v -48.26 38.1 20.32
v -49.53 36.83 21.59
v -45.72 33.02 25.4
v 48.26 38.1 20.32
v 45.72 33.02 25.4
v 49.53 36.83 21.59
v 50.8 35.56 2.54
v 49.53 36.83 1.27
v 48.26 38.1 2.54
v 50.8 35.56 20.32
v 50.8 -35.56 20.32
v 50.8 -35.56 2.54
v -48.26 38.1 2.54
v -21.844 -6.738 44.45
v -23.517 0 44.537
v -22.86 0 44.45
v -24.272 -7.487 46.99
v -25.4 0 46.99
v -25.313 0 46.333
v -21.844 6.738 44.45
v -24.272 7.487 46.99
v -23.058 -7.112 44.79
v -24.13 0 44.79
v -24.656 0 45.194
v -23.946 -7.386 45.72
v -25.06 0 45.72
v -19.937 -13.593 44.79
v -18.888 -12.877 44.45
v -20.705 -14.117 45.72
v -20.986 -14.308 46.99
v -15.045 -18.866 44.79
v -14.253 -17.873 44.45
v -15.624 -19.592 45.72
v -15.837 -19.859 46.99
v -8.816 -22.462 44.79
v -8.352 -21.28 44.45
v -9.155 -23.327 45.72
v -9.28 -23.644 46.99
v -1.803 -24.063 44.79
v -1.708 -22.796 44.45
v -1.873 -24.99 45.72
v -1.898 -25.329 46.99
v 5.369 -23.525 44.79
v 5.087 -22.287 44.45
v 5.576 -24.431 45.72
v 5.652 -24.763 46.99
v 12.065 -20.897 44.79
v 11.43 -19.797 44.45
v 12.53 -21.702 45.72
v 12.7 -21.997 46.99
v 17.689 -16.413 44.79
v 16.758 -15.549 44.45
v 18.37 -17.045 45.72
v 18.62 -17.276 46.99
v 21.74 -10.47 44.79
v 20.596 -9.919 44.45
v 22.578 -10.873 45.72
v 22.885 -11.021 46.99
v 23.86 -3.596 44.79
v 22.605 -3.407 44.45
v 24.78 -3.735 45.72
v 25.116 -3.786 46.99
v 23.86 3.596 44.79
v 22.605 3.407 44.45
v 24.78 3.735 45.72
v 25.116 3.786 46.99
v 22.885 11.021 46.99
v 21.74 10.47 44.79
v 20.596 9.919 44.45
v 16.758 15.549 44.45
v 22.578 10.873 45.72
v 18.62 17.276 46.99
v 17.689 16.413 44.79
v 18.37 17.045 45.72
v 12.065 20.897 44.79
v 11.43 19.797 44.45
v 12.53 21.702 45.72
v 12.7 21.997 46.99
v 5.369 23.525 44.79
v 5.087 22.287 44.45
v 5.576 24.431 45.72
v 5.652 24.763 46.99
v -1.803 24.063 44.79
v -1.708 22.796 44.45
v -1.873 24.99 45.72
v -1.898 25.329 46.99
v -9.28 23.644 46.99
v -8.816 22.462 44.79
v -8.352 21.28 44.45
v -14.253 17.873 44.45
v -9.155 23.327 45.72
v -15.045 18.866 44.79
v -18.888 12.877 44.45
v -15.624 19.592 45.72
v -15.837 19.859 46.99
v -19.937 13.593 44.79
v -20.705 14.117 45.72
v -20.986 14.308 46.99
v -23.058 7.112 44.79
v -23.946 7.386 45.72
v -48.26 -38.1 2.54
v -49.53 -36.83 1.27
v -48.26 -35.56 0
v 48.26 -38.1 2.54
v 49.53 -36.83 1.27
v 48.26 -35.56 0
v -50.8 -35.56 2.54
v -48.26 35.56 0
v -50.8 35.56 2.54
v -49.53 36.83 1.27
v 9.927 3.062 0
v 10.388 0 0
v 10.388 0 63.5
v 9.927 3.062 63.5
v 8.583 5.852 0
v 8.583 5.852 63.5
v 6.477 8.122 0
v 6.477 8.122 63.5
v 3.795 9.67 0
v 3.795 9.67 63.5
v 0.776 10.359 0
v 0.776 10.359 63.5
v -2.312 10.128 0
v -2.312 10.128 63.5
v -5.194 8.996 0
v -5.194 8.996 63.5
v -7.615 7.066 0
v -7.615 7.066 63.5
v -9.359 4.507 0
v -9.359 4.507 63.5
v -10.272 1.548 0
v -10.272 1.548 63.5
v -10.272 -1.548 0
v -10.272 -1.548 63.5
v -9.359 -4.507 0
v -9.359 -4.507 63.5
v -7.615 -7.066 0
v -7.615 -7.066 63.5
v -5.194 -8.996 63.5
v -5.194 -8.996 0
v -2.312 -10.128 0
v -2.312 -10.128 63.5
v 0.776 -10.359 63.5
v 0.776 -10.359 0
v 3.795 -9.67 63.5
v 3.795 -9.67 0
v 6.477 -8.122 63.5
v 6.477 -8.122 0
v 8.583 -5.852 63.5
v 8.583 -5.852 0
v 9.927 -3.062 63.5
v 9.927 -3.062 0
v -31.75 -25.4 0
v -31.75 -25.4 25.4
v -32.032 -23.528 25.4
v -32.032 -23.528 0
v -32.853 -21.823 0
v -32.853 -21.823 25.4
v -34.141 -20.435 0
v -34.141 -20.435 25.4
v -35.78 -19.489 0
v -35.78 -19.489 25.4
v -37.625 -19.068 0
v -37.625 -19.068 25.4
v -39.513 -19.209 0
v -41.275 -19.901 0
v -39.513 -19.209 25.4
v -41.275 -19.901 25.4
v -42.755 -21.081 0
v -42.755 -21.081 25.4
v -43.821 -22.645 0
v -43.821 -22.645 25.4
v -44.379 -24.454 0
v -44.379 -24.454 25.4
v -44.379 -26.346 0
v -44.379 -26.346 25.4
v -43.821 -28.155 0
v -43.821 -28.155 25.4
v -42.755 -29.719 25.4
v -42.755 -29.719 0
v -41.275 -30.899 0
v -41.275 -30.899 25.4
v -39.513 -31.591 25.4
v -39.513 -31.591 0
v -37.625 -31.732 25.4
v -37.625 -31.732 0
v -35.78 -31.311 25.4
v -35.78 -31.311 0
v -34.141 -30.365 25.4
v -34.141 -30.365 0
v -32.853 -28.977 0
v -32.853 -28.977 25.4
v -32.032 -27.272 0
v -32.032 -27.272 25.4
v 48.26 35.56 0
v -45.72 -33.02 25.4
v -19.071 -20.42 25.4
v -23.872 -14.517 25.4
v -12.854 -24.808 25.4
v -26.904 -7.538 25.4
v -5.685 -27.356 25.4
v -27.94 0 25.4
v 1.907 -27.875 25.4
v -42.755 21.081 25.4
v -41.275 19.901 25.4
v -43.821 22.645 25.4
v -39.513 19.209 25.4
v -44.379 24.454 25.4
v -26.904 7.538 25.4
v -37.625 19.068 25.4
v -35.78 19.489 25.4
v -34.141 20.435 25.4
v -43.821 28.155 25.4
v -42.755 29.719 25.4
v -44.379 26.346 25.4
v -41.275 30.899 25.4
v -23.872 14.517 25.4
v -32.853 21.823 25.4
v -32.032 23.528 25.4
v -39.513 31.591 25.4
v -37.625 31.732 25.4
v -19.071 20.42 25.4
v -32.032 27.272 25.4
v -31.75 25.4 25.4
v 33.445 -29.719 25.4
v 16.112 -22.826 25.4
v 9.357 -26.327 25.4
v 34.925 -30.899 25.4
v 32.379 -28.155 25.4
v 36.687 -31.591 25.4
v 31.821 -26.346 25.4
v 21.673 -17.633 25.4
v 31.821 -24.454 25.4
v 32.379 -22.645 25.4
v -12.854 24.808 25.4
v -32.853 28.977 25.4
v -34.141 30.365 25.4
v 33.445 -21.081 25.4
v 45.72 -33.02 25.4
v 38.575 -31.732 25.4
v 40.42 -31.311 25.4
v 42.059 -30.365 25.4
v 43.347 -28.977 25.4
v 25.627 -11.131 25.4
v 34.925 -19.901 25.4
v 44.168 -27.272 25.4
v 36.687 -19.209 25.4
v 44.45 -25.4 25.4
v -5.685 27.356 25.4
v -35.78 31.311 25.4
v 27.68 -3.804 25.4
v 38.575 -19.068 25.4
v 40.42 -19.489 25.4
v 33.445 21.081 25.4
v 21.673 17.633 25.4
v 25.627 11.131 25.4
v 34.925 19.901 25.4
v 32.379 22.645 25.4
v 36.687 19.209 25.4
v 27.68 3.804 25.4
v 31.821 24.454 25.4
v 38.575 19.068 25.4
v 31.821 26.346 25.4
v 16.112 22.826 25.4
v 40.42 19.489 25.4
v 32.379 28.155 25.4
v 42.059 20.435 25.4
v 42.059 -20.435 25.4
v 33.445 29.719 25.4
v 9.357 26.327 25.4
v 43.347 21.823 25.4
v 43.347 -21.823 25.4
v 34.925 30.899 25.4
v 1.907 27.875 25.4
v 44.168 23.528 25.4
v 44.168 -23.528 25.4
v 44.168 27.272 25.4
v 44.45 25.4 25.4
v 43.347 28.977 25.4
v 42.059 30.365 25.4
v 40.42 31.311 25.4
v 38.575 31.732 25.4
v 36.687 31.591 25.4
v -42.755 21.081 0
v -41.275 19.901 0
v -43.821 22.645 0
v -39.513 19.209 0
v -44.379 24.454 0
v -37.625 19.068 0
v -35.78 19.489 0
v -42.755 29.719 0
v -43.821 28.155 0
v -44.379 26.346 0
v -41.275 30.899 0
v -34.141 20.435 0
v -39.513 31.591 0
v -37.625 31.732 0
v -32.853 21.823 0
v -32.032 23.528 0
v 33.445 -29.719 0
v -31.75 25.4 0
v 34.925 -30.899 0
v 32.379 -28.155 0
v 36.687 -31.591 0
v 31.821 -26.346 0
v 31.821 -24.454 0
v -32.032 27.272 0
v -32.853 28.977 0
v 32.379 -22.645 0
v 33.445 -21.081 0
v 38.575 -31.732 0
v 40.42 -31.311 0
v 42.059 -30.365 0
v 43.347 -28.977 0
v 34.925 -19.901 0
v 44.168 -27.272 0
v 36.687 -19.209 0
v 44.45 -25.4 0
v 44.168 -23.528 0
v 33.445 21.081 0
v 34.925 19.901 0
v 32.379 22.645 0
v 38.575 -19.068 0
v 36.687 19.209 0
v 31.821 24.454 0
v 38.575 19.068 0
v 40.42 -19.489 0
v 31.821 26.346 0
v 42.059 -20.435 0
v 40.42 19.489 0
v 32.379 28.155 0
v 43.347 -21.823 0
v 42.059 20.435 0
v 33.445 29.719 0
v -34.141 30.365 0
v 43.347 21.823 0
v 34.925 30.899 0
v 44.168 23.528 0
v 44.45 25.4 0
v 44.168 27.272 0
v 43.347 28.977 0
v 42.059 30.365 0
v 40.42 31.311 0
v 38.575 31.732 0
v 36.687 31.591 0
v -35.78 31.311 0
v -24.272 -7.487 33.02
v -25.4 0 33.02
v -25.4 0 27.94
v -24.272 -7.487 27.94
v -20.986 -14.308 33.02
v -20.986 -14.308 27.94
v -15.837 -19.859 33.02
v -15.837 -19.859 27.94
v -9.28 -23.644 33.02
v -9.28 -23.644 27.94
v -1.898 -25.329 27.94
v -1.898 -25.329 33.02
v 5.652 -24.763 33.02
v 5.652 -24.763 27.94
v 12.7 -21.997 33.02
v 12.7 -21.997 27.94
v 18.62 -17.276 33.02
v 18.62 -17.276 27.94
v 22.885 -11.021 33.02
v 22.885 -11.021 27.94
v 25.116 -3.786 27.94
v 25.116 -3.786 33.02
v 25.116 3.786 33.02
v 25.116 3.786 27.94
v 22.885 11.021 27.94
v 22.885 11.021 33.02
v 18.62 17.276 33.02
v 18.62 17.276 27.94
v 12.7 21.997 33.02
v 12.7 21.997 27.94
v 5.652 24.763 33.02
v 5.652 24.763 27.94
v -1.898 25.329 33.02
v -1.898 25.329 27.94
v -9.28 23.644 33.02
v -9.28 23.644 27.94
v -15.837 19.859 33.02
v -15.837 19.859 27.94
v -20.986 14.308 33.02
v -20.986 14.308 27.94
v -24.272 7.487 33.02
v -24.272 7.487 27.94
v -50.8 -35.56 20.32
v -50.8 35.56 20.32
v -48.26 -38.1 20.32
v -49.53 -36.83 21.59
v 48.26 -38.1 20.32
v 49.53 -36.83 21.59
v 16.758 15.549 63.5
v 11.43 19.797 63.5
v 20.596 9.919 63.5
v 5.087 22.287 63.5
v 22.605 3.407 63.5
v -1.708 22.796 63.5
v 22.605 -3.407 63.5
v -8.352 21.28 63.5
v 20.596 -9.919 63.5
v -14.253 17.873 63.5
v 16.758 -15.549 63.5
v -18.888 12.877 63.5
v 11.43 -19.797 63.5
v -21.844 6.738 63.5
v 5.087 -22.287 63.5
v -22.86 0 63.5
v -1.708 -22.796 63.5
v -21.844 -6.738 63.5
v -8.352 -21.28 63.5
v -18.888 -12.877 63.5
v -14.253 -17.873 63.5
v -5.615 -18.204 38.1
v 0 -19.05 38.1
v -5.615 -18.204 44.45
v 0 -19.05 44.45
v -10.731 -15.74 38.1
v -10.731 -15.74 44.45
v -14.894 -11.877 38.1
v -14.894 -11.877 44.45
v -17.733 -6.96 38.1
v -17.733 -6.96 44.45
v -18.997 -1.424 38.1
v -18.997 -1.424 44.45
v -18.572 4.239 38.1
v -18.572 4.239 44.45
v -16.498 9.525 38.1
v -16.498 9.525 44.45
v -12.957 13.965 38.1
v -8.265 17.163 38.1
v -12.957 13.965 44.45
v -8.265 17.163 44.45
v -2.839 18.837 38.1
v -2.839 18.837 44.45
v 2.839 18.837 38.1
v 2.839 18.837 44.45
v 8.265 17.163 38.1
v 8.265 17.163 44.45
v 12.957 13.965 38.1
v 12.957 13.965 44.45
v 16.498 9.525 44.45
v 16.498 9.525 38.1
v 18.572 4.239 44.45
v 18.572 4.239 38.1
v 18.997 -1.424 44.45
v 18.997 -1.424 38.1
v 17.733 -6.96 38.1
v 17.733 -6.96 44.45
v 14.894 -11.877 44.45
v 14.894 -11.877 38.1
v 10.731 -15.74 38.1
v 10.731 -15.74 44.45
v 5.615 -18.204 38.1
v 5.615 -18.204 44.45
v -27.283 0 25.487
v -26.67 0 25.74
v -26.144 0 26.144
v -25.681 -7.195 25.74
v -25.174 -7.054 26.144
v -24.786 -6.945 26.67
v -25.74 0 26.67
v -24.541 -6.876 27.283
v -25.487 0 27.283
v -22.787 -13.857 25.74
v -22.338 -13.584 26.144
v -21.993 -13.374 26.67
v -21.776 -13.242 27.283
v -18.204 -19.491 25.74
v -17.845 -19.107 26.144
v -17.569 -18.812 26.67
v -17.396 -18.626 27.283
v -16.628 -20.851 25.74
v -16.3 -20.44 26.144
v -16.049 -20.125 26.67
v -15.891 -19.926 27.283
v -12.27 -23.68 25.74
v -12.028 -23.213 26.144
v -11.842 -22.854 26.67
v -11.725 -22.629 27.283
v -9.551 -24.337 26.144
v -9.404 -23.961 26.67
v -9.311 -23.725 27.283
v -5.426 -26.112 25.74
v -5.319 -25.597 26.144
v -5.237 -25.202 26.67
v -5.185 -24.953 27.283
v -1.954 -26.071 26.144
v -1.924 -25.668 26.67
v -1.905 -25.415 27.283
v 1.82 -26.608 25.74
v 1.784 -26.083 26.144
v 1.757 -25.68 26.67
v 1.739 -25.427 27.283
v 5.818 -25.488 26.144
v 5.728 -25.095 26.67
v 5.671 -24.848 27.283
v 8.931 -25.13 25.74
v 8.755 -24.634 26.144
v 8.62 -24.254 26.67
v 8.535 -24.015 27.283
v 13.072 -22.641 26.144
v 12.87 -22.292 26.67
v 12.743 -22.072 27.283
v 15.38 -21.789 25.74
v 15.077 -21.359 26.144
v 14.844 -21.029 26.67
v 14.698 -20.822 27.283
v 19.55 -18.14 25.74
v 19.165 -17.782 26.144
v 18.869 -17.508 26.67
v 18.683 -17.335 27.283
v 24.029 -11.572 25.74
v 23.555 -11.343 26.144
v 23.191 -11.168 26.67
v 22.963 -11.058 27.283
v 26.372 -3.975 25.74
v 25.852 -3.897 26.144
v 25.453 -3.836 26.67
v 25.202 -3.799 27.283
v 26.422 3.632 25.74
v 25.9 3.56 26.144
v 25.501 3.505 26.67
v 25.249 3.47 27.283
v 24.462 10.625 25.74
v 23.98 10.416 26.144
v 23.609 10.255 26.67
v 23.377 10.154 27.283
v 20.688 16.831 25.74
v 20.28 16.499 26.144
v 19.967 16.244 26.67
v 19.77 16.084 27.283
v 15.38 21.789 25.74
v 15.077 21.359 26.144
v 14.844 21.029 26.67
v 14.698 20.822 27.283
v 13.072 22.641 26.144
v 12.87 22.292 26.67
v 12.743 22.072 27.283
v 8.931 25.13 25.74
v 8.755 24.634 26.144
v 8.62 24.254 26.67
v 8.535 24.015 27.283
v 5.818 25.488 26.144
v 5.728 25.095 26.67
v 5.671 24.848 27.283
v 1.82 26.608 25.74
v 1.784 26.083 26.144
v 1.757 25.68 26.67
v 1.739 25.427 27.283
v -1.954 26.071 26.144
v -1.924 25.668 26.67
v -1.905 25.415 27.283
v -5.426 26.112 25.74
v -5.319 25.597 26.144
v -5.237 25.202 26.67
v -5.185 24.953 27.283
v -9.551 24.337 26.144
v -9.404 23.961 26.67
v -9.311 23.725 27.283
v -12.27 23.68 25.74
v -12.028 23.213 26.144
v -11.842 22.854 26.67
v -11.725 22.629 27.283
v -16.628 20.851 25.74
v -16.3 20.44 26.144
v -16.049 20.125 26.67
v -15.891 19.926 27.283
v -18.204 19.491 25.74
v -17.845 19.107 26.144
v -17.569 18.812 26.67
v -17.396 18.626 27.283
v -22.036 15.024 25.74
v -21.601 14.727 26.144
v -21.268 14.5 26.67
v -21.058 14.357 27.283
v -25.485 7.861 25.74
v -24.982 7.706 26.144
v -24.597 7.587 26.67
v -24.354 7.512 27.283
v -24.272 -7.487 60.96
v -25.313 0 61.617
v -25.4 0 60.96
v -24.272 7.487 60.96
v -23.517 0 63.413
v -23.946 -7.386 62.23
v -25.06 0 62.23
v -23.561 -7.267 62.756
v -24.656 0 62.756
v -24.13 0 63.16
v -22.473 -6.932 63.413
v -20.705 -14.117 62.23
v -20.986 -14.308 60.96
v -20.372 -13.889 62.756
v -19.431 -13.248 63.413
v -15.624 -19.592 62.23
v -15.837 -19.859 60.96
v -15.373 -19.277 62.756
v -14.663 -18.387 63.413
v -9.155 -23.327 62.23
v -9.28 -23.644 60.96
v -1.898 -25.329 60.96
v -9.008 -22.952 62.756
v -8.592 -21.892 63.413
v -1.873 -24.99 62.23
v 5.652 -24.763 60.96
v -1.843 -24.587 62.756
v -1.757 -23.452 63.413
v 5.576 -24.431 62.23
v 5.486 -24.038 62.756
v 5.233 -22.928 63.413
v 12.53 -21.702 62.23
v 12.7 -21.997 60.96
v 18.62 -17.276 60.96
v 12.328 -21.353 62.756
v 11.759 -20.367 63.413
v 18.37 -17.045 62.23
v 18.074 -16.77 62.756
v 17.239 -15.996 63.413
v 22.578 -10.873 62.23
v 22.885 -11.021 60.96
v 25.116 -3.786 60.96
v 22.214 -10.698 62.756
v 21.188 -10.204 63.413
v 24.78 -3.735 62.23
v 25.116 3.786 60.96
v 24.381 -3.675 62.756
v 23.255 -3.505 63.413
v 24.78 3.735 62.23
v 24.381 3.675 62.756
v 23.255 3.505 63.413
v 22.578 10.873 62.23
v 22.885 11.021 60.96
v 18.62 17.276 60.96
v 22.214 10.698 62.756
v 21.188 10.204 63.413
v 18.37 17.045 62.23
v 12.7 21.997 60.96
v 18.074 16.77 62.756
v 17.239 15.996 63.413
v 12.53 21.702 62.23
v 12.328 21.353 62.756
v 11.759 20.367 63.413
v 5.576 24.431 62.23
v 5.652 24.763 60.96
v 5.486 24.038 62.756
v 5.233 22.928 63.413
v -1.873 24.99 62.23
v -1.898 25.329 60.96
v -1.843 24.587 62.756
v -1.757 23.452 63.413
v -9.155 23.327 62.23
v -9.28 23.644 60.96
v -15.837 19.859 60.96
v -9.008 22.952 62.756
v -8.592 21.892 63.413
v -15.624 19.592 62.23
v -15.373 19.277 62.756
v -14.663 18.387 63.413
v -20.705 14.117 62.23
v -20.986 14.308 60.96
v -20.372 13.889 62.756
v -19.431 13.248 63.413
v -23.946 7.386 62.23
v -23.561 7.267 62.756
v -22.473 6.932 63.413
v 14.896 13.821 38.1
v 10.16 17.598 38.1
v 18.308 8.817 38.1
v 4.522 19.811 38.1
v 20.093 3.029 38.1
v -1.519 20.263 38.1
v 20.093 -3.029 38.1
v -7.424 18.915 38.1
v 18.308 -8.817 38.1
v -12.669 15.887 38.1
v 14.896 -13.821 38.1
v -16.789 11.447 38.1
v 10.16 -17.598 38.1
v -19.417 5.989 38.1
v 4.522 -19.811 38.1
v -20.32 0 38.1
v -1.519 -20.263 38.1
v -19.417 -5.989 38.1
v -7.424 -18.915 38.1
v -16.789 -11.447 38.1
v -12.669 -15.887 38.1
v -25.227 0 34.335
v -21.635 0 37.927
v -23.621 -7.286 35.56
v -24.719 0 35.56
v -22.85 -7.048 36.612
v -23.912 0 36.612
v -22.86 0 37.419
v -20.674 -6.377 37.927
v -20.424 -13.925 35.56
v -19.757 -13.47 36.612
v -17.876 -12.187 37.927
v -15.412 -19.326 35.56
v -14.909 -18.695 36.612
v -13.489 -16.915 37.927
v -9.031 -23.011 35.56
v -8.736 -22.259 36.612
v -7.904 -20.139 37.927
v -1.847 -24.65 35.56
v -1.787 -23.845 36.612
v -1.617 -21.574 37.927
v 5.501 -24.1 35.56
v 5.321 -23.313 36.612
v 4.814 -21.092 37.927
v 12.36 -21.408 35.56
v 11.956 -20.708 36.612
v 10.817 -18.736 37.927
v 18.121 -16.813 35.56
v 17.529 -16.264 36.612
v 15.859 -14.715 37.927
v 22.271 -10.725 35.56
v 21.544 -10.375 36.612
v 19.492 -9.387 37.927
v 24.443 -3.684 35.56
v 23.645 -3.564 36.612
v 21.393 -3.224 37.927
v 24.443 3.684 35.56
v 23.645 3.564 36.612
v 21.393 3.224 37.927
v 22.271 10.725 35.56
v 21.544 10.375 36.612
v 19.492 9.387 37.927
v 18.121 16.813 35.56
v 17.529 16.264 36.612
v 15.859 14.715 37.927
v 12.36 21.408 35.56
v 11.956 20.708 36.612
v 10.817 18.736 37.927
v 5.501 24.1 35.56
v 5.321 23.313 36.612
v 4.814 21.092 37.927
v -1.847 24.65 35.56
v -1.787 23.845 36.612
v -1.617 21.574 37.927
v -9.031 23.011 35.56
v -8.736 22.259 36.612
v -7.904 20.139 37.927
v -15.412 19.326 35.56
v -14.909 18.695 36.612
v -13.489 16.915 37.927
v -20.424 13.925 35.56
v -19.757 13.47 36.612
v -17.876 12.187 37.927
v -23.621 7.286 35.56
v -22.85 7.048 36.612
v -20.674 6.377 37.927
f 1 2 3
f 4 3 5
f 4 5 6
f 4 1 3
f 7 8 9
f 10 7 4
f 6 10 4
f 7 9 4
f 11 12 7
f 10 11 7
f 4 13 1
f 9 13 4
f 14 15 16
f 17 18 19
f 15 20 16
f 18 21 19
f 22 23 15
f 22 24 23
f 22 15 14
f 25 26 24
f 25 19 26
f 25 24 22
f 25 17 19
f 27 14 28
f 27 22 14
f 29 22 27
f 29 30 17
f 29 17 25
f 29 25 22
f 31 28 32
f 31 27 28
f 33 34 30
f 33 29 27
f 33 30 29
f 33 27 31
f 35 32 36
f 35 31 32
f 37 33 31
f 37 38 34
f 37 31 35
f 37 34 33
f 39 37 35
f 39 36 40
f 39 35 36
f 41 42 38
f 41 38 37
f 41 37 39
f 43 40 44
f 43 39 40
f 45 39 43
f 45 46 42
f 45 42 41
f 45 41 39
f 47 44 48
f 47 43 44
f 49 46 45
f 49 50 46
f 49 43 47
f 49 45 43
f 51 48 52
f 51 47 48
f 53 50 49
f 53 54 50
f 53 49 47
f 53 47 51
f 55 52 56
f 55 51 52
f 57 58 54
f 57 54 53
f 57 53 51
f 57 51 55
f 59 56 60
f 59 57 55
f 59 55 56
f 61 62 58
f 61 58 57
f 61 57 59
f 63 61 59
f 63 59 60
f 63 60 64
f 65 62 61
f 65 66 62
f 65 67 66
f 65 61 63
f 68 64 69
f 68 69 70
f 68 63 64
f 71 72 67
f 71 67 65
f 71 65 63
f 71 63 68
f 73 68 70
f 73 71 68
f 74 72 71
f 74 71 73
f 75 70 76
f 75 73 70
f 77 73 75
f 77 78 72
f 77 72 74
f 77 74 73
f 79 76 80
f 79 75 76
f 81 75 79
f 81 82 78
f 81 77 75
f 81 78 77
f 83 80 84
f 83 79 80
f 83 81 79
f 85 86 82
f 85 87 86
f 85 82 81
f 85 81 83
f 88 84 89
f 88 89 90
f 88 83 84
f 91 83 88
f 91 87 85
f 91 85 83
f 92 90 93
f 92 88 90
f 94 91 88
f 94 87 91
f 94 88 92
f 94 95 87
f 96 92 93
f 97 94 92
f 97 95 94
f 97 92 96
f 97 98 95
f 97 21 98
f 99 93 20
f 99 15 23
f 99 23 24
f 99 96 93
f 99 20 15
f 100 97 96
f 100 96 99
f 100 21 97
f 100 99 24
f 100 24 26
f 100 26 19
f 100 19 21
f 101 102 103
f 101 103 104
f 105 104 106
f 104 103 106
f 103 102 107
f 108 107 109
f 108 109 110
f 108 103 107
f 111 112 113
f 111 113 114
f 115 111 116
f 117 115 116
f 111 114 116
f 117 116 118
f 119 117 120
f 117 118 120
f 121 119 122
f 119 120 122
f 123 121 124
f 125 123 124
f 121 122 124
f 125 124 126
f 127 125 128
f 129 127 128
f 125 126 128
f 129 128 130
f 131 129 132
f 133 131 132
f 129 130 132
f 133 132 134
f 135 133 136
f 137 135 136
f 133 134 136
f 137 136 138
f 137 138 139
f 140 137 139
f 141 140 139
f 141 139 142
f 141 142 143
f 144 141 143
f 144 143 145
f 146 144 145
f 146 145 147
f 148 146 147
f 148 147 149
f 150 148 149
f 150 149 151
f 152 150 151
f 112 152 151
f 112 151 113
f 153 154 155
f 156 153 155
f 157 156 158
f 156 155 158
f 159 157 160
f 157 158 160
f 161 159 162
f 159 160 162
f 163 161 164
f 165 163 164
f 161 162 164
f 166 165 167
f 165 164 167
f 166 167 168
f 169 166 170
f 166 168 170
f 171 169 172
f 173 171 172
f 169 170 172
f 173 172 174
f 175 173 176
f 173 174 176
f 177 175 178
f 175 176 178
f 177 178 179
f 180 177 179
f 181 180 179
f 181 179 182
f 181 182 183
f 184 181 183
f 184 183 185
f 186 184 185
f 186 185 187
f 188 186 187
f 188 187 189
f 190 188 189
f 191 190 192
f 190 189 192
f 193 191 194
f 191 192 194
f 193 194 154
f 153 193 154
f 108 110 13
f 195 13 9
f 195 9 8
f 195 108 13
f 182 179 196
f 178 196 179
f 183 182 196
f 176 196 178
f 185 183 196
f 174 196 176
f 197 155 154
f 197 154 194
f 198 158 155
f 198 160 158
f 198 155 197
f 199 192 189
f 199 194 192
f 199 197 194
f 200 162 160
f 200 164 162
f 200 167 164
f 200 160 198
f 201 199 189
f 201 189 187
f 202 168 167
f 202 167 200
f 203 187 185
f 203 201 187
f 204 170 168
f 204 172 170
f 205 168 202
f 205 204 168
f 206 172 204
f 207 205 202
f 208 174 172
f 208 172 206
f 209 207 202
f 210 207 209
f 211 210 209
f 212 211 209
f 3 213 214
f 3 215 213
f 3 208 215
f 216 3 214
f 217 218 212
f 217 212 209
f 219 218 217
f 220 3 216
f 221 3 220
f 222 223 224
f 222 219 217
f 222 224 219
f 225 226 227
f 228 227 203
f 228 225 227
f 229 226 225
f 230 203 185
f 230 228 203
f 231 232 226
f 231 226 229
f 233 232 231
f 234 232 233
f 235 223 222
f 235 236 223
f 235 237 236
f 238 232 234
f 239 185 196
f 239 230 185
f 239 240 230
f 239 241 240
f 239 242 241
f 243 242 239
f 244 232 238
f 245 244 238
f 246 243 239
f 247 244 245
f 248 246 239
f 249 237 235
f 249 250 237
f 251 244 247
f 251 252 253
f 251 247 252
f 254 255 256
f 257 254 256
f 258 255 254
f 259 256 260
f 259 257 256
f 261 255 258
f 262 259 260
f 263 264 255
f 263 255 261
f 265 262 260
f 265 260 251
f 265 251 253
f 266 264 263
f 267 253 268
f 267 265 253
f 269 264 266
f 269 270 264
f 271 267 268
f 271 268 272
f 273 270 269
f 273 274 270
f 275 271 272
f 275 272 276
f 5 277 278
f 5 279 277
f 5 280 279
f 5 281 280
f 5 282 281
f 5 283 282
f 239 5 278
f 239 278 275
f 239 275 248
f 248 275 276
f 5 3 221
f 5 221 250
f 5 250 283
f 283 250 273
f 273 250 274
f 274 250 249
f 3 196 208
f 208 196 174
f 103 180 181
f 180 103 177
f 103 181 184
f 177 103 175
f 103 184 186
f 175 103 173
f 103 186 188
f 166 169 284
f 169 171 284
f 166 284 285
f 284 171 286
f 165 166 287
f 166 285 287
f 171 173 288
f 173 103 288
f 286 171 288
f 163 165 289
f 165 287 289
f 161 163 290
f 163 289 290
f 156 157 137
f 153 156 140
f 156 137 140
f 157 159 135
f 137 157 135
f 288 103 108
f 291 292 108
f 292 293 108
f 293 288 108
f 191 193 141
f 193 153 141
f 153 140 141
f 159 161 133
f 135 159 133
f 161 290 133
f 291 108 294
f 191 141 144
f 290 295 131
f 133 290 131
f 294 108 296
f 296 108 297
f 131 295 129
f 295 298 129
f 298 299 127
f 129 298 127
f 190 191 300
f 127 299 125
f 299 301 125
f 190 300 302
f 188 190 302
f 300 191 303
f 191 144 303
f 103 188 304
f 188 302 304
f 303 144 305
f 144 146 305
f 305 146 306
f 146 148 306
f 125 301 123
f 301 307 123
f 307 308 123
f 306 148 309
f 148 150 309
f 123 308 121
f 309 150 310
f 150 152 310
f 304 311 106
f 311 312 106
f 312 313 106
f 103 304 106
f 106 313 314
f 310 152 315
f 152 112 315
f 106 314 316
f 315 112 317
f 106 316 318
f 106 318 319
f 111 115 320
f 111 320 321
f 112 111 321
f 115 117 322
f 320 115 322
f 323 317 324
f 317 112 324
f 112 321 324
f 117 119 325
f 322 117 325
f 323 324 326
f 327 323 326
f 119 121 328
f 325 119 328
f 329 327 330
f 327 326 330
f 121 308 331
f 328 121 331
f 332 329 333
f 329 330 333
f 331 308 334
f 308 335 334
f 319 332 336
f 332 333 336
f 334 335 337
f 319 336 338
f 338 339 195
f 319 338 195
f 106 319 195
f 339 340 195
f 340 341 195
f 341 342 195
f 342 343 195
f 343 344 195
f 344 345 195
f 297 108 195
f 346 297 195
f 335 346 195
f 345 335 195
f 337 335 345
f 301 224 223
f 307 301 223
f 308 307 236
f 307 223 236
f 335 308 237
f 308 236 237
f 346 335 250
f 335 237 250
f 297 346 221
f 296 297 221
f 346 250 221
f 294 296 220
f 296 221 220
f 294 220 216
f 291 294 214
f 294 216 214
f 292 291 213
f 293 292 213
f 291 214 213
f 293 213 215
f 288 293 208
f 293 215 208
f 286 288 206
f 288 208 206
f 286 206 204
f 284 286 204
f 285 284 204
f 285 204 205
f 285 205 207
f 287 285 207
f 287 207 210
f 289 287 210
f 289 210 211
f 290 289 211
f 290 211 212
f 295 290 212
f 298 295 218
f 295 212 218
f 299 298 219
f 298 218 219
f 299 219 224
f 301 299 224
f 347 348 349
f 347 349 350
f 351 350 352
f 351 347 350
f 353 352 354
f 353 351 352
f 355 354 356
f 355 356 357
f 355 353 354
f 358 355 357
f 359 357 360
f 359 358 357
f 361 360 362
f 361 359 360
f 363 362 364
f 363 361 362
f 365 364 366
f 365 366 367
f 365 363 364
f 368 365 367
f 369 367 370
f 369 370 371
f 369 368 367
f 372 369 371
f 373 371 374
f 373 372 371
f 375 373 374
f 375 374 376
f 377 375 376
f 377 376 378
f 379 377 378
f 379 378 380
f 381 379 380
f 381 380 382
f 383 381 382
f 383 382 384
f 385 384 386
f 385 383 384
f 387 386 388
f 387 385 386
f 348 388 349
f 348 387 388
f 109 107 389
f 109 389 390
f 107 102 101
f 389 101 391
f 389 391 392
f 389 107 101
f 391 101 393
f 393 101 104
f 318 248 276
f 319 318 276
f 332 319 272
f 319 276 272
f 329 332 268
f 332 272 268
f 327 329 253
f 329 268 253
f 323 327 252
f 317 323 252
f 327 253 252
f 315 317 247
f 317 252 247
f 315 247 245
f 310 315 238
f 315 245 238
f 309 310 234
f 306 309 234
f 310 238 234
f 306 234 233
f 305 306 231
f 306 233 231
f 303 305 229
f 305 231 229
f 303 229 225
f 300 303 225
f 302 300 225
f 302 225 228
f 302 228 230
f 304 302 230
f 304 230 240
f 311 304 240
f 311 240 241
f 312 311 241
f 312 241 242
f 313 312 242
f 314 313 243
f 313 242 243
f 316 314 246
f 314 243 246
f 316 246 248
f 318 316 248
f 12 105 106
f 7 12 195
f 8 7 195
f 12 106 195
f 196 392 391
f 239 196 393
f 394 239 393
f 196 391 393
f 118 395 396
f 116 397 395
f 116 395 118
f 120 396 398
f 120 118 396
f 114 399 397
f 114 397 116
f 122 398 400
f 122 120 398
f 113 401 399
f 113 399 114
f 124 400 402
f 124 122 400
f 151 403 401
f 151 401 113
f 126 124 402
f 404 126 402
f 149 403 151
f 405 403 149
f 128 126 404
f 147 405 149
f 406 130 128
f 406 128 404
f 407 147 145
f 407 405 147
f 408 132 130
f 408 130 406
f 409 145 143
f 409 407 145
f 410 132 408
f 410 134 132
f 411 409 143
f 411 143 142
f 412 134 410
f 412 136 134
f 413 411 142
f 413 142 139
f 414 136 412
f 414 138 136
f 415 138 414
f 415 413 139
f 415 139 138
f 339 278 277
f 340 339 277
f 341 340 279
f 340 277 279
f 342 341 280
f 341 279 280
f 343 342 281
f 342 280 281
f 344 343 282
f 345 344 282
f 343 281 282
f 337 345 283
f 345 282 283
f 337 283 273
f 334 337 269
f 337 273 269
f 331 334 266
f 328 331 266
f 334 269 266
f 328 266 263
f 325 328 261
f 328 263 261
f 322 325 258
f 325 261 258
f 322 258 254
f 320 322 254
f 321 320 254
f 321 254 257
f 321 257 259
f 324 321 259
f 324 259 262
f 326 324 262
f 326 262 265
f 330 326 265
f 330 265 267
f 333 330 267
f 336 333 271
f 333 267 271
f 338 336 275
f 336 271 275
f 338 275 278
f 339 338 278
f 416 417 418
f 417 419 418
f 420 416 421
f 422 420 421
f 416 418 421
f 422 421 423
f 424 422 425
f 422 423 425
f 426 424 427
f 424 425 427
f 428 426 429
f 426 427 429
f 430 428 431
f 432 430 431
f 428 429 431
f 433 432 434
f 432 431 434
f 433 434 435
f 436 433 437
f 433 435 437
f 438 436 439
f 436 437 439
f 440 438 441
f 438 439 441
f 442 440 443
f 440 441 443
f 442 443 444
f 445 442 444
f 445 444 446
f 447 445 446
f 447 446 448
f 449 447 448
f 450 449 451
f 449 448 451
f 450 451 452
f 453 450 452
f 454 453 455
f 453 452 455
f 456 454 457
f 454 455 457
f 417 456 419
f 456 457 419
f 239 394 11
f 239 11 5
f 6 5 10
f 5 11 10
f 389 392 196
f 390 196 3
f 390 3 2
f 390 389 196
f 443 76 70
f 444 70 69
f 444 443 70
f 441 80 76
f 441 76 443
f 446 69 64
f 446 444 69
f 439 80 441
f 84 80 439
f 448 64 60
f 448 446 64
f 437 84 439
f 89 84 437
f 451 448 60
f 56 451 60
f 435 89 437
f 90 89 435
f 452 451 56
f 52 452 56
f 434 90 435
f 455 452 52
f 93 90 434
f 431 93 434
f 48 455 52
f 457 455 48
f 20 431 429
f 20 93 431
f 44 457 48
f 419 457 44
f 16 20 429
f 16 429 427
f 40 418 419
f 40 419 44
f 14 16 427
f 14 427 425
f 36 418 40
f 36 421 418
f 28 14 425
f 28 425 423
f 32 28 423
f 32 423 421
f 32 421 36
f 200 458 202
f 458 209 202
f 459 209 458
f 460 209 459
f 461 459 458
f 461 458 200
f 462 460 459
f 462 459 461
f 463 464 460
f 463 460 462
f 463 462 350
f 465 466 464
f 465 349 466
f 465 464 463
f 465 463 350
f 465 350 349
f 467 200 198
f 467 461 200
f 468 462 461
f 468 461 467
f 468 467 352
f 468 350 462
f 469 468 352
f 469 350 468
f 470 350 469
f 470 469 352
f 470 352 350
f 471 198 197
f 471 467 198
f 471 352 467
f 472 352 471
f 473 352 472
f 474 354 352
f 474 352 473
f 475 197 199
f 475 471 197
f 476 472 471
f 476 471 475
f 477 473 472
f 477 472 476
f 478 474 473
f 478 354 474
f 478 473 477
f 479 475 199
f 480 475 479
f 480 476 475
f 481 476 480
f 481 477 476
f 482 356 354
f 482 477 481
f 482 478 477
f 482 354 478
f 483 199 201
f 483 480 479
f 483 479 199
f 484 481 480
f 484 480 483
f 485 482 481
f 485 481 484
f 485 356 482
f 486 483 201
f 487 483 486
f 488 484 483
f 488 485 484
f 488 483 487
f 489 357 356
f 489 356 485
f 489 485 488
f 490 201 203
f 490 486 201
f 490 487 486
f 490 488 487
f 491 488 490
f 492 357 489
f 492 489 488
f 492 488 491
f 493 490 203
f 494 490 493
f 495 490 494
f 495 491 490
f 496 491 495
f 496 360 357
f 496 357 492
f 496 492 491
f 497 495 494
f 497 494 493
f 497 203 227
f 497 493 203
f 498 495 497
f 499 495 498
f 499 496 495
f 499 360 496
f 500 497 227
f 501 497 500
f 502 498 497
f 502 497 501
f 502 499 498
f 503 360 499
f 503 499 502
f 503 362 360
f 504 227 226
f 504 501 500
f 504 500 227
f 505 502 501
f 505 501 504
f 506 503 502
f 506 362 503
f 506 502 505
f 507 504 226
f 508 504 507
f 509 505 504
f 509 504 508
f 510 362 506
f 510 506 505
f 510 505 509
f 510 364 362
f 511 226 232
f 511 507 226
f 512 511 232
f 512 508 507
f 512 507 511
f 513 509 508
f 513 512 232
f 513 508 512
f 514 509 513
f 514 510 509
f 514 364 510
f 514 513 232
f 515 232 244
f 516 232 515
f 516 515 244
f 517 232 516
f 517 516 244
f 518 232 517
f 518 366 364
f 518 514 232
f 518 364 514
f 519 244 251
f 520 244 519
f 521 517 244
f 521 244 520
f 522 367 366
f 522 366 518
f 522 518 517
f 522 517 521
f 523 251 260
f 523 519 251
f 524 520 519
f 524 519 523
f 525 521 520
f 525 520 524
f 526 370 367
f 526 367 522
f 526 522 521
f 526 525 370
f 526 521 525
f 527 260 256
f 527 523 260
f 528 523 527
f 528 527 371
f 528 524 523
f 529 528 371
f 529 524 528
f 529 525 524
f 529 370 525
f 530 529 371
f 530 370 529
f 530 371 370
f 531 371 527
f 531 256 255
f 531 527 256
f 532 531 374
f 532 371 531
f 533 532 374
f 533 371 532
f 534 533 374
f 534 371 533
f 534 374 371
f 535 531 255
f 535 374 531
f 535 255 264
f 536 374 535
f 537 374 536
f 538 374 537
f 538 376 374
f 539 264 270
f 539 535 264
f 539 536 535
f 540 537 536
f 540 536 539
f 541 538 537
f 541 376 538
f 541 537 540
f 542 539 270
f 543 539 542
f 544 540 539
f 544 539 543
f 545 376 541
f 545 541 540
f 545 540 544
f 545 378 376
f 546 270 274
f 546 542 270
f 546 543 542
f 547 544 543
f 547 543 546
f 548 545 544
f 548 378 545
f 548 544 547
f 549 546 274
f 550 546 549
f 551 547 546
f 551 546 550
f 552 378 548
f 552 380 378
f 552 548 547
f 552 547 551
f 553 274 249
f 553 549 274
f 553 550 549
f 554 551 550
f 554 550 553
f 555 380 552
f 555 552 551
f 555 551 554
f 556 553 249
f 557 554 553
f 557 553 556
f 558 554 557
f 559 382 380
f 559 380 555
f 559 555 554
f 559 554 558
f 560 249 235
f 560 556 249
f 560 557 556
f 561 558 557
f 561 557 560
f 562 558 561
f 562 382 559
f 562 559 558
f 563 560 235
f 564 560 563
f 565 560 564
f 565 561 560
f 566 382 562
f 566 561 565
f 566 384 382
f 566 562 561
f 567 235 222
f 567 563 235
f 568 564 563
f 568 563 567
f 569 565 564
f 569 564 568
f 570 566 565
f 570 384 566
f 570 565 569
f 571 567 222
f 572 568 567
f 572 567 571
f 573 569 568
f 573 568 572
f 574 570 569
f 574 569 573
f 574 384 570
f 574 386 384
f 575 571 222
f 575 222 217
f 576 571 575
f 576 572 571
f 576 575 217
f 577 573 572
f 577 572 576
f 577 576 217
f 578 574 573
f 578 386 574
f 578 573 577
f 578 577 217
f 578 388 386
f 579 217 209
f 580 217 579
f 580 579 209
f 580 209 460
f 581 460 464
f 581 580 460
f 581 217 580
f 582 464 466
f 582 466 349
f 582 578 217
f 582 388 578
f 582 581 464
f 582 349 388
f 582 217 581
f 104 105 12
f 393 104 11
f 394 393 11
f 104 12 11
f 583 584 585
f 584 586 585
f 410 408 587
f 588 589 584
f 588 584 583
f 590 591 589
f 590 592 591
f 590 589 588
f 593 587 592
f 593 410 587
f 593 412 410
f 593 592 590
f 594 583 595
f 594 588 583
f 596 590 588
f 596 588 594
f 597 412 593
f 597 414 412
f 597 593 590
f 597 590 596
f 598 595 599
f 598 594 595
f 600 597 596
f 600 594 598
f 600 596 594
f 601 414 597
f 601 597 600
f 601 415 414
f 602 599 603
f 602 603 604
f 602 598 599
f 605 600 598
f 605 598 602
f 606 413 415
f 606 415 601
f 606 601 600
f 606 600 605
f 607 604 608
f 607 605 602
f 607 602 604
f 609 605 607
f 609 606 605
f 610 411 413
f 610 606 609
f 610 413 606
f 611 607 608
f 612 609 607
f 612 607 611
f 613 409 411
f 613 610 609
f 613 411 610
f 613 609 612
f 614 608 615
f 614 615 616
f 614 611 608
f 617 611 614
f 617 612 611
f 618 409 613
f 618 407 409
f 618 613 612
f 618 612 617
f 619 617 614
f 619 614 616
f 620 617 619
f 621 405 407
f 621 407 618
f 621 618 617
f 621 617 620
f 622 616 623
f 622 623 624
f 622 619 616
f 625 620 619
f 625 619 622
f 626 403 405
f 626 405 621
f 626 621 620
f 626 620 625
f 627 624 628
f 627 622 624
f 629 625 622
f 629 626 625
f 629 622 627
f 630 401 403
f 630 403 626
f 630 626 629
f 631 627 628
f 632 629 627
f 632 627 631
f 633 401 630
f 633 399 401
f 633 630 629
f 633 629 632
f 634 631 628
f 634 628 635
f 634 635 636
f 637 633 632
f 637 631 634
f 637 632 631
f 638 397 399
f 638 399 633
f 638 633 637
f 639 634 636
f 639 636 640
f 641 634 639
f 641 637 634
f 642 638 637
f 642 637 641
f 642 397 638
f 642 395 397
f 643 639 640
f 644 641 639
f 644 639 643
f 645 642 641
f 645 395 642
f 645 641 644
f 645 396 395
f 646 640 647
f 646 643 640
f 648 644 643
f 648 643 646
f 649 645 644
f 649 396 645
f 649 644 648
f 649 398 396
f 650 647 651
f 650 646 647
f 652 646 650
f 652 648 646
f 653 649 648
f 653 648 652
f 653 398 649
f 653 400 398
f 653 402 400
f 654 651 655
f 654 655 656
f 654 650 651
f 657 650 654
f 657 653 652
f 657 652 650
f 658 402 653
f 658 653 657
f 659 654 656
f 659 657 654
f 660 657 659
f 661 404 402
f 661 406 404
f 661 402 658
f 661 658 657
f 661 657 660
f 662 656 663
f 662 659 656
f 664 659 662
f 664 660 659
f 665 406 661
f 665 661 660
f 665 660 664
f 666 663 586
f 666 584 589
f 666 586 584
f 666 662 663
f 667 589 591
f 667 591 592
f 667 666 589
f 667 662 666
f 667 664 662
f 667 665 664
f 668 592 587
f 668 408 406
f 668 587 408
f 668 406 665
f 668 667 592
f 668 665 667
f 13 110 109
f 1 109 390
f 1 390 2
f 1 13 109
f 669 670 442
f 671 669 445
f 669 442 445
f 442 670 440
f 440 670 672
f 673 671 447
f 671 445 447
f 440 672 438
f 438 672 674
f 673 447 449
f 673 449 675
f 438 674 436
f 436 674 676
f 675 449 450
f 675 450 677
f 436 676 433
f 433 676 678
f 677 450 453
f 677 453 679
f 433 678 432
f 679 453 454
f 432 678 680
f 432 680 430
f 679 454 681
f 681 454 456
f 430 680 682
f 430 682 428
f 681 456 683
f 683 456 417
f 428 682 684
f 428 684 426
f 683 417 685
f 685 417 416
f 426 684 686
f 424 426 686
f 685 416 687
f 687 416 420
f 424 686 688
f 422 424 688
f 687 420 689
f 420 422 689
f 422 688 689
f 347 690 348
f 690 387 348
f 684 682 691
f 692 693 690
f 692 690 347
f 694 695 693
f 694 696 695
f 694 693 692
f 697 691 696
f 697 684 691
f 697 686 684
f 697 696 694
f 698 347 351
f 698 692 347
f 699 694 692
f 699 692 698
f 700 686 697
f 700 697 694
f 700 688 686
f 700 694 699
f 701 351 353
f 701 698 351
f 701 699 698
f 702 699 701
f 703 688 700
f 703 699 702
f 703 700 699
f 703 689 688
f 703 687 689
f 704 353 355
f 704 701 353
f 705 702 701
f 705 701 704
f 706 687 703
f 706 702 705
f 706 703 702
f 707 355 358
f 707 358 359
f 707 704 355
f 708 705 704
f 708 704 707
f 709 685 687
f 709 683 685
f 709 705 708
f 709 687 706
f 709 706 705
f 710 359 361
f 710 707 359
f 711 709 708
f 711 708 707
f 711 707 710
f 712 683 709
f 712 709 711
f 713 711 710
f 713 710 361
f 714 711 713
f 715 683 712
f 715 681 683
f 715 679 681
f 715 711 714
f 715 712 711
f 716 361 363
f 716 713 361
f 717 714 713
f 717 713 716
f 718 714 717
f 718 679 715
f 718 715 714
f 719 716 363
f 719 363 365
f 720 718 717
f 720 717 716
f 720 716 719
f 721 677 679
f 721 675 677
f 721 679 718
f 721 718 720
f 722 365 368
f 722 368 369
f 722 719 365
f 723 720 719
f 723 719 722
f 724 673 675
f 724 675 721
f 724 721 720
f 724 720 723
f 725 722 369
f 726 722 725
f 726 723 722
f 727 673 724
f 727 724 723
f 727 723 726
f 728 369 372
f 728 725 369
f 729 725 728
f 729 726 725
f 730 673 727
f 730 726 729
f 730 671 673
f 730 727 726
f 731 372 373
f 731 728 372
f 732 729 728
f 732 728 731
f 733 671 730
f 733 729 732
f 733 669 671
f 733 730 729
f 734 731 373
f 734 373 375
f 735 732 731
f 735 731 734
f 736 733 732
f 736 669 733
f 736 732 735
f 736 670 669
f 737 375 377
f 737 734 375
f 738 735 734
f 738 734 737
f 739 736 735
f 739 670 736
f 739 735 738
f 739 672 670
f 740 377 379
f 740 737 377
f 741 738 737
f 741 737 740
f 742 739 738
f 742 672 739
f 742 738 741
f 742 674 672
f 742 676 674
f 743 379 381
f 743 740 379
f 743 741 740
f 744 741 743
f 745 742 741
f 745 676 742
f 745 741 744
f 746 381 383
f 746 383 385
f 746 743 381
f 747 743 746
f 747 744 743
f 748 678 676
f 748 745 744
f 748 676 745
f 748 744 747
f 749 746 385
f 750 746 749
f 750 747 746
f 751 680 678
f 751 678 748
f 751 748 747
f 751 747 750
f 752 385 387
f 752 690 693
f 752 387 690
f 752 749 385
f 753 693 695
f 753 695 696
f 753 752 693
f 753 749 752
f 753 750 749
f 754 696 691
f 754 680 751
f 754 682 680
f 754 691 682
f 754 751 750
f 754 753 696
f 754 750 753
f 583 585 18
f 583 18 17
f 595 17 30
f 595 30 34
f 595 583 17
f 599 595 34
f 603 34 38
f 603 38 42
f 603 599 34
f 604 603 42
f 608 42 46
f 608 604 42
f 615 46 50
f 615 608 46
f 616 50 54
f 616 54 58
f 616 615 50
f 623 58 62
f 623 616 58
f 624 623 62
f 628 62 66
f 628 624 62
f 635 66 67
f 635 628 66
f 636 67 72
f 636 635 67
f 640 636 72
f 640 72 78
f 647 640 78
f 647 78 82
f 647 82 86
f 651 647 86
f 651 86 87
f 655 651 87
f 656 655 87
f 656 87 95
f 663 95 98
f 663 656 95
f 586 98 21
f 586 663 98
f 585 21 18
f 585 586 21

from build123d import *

# Parameters (mm, degrees)
F0_W      = 101.6
F0_H      = 76.2
F1_DEPTH  = 25.4
F2_R      = 6.35
F3_DEPTH  = 25.4
F4_W      = 25.4
F4_H      = 38.1
F6_W      = 30.48
F6_H      = 6.35
F8_R      = 5.08
F9_SIZE   = 5.08
F10_R     = 2.54
F11_SIZE  = 2.54
F12_SIZE  = 2.54
F13_R     = 10.3882483968
F14_DEPTH = 76.2


with BuildPart() as f1:
    # F0 (on Top) → F1 (new body)
    with BuildSketch(Plane.XY):
        Rectangle(F0_W, F0_H)
    extrude(amount=F1_DEPTH)

    # F2 (on face) → F3 (cut)
    with BuildSketch(Plane.XY.offset(25.4)):
        with Locations((-38.1, 25.4)):
            Circle(F2_R)
        with Locations((38.1, 25.4)):
            Circle(F2_R)
        with Locations((38.1, -25.4)):
            Circle(F2_R)
        with Locations((-38.1, -25.4)):
            Circle(F2_R)
    extrude(amount=-F3_DEPTH, mode=Mode.SUBTRACT)

    # F4 (on Front) → F5 (revolve)
    with BuildSketch(Plane.XZ):
        with Locations((-12.7, 44.45)):
            Rectangle(F4_W, F4_H)
    revolve(axis=Axis((0, 0, 44.45), (0, 0, 1)))

    # F6 (on Right) → F7 (revolve, cut)
    with BuildSketch(Plane.YZ):
        with Locations((-34.29, 41.275)):
            Rectangle(F6_W, F6_H)
    revolve(axis=Axis((0, 0, 63.5), (0, 0, -1)), mode=Mode.SUBTRACT)

    # F8
    f8_edges = [f1.edges().sort_by_distance(p)[0] for p in [
        (25.4, 0, 38.1),
    ]]
    fillet(f8_edges, radius=F8_R)

    # F9
    f9_edges = [f1.edges().sort_by_distance(p)[0] for p in [
        (0, -38.1, 25.4),
        (50.8, 0, 25.4),
        (0, 38.1, 25.4),
        (-50.8, 0, 25.4),
    ]]
    chamfer(f9_edges, length=F9_SIZE)

    # F10
    f10_edges = [f1.edges().sort_by_distance(p)[0] for p in [
        (25.4, 0, 25.4),
        (25.4, 0, 33.02),
        (25.4, 0, 44.45),
        (25.4, 0, 63.5),
    ]]
    fillet(f10_edges, radius=F10_R)

    # F11
    f11_edges = [f1.edges().sort_by_distance(p)[0] for p in [
        (0, -38.1, 0),
        (50.8, 0, 0),
        (0, 38.1, 0),
        (-50.8, 0, 0),
    ]]
    chamfer(f11_edges, length=F11_SIZE)

    # F12
    f12_edges = [f1.edges().sort_by_distance(p)[0] for p in [
        (-50.8, 38.1, 11.43),
        (-50.8, -38.1, 11.43),
        (50.8, 38.1, 11.43),
        (50.8, -38.1, 11.43),
    ]]
    chamfer(f12_edges, length=F12_SIZE)

    # F13 (on face) → F14 (cut)
    with BuildSketch(Plane.XY.offset(63.5)):
        Circle(F13_R)
    extrude(amount=-F14_DEPTH, mode=Mode.SUBTRACT)


solid = f1.part
